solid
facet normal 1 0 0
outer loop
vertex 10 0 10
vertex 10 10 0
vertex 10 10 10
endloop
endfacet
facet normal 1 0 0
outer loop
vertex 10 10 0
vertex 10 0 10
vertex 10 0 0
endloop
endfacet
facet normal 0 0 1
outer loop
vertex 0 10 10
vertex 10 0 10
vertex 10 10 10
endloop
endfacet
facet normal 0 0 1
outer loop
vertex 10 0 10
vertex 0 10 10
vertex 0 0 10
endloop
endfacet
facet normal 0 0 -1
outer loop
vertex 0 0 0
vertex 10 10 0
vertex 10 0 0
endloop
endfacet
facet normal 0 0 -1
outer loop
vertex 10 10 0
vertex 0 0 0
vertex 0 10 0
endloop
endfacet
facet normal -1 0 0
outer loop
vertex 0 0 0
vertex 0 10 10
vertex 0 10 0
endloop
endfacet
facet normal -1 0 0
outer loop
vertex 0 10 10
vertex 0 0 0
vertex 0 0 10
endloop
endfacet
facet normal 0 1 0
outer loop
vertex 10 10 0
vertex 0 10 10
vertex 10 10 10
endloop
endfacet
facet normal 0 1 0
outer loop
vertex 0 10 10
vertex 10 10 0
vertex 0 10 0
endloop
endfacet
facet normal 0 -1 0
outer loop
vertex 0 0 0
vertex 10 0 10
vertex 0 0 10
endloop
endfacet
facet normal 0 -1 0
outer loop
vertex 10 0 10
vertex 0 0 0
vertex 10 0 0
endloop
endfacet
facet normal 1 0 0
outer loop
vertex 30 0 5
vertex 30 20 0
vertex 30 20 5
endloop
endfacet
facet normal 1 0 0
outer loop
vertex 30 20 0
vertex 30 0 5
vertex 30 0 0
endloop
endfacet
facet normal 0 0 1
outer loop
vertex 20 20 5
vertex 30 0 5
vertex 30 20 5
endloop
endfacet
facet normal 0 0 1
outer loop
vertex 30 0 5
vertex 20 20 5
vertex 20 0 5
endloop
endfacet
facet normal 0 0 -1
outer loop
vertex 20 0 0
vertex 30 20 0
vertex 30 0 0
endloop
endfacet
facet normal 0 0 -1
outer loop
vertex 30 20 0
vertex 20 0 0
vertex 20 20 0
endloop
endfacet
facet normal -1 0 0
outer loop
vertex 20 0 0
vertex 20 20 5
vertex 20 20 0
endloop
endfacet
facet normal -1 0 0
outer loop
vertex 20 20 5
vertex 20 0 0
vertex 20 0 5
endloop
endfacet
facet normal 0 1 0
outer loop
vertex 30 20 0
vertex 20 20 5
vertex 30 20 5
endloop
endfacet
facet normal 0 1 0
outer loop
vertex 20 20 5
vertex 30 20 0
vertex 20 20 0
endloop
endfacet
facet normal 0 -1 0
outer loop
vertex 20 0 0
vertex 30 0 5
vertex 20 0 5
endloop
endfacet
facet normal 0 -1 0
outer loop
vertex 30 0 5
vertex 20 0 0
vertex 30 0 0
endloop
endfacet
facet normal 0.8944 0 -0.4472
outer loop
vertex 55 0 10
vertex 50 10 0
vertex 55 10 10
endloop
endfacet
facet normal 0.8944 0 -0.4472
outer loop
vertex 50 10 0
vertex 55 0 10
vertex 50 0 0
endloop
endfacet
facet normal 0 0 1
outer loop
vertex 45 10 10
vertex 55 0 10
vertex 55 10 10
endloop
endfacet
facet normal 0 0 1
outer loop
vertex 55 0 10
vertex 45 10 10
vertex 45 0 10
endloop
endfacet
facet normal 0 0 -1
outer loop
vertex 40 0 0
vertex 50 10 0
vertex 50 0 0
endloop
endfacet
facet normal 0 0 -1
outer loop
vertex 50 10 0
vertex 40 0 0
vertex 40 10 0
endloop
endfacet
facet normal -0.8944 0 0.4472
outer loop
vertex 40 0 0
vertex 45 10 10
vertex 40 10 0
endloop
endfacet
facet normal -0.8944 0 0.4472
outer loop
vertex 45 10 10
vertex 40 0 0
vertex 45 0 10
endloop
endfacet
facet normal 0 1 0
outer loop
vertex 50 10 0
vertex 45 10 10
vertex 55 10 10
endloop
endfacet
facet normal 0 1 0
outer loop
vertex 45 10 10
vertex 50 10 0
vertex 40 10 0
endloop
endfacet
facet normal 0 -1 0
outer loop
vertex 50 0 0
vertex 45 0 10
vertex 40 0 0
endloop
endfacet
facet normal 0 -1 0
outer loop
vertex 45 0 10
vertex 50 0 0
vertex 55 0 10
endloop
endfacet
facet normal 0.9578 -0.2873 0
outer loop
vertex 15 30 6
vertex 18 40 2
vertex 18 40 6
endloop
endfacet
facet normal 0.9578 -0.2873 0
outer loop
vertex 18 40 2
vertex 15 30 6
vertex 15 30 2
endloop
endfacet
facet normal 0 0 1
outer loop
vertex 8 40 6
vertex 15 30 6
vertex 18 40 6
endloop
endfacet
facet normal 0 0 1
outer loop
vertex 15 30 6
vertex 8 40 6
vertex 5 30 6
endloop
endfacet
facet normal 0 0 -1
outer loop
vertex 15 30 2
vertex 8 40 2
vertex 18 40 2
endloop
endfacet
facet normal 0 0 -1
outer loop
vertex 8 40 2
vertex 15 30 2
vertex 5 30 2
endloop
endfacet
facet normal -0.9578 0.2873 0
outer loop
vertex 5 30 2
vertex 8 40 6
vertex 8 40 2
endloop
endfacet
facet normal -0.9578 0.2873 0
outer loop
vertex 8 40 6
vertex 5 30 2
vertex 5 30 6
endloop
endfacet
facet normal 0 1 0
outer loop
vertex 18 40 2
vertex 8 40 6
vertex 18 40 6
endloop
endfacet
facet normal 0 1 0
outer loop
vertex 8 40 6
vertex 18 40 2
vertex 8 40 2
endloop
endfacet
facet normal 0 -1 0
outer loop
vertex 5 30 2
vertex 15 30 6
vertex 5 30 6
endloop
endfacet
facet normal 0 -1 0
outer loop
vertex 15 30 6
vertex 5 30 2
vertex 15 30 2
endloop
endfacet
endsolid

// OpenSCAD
// Purpose: scale (number and vector) and multmatrix (shear, 3x4 and 4x4).
scale(2) cube(5);
translate([20, 0, 0]) scale([1, 2, 0.5]) cube(10);
translate([40, 0, 0]) multmatrix([[1, 0, 0.5, 0],
                                  [0, 1, 0, 0],
                                  [0, 0, 1, 0]]) cube(10);
translate([0, 30, 0]) multmatrix([[1, 0.3, 0, 5],
                                  [0, 1, 0, 0],
                                  [0, 0, 1, 2],
                                  [0, 0, 0, 1]]) cube([10, 10, 4]);
